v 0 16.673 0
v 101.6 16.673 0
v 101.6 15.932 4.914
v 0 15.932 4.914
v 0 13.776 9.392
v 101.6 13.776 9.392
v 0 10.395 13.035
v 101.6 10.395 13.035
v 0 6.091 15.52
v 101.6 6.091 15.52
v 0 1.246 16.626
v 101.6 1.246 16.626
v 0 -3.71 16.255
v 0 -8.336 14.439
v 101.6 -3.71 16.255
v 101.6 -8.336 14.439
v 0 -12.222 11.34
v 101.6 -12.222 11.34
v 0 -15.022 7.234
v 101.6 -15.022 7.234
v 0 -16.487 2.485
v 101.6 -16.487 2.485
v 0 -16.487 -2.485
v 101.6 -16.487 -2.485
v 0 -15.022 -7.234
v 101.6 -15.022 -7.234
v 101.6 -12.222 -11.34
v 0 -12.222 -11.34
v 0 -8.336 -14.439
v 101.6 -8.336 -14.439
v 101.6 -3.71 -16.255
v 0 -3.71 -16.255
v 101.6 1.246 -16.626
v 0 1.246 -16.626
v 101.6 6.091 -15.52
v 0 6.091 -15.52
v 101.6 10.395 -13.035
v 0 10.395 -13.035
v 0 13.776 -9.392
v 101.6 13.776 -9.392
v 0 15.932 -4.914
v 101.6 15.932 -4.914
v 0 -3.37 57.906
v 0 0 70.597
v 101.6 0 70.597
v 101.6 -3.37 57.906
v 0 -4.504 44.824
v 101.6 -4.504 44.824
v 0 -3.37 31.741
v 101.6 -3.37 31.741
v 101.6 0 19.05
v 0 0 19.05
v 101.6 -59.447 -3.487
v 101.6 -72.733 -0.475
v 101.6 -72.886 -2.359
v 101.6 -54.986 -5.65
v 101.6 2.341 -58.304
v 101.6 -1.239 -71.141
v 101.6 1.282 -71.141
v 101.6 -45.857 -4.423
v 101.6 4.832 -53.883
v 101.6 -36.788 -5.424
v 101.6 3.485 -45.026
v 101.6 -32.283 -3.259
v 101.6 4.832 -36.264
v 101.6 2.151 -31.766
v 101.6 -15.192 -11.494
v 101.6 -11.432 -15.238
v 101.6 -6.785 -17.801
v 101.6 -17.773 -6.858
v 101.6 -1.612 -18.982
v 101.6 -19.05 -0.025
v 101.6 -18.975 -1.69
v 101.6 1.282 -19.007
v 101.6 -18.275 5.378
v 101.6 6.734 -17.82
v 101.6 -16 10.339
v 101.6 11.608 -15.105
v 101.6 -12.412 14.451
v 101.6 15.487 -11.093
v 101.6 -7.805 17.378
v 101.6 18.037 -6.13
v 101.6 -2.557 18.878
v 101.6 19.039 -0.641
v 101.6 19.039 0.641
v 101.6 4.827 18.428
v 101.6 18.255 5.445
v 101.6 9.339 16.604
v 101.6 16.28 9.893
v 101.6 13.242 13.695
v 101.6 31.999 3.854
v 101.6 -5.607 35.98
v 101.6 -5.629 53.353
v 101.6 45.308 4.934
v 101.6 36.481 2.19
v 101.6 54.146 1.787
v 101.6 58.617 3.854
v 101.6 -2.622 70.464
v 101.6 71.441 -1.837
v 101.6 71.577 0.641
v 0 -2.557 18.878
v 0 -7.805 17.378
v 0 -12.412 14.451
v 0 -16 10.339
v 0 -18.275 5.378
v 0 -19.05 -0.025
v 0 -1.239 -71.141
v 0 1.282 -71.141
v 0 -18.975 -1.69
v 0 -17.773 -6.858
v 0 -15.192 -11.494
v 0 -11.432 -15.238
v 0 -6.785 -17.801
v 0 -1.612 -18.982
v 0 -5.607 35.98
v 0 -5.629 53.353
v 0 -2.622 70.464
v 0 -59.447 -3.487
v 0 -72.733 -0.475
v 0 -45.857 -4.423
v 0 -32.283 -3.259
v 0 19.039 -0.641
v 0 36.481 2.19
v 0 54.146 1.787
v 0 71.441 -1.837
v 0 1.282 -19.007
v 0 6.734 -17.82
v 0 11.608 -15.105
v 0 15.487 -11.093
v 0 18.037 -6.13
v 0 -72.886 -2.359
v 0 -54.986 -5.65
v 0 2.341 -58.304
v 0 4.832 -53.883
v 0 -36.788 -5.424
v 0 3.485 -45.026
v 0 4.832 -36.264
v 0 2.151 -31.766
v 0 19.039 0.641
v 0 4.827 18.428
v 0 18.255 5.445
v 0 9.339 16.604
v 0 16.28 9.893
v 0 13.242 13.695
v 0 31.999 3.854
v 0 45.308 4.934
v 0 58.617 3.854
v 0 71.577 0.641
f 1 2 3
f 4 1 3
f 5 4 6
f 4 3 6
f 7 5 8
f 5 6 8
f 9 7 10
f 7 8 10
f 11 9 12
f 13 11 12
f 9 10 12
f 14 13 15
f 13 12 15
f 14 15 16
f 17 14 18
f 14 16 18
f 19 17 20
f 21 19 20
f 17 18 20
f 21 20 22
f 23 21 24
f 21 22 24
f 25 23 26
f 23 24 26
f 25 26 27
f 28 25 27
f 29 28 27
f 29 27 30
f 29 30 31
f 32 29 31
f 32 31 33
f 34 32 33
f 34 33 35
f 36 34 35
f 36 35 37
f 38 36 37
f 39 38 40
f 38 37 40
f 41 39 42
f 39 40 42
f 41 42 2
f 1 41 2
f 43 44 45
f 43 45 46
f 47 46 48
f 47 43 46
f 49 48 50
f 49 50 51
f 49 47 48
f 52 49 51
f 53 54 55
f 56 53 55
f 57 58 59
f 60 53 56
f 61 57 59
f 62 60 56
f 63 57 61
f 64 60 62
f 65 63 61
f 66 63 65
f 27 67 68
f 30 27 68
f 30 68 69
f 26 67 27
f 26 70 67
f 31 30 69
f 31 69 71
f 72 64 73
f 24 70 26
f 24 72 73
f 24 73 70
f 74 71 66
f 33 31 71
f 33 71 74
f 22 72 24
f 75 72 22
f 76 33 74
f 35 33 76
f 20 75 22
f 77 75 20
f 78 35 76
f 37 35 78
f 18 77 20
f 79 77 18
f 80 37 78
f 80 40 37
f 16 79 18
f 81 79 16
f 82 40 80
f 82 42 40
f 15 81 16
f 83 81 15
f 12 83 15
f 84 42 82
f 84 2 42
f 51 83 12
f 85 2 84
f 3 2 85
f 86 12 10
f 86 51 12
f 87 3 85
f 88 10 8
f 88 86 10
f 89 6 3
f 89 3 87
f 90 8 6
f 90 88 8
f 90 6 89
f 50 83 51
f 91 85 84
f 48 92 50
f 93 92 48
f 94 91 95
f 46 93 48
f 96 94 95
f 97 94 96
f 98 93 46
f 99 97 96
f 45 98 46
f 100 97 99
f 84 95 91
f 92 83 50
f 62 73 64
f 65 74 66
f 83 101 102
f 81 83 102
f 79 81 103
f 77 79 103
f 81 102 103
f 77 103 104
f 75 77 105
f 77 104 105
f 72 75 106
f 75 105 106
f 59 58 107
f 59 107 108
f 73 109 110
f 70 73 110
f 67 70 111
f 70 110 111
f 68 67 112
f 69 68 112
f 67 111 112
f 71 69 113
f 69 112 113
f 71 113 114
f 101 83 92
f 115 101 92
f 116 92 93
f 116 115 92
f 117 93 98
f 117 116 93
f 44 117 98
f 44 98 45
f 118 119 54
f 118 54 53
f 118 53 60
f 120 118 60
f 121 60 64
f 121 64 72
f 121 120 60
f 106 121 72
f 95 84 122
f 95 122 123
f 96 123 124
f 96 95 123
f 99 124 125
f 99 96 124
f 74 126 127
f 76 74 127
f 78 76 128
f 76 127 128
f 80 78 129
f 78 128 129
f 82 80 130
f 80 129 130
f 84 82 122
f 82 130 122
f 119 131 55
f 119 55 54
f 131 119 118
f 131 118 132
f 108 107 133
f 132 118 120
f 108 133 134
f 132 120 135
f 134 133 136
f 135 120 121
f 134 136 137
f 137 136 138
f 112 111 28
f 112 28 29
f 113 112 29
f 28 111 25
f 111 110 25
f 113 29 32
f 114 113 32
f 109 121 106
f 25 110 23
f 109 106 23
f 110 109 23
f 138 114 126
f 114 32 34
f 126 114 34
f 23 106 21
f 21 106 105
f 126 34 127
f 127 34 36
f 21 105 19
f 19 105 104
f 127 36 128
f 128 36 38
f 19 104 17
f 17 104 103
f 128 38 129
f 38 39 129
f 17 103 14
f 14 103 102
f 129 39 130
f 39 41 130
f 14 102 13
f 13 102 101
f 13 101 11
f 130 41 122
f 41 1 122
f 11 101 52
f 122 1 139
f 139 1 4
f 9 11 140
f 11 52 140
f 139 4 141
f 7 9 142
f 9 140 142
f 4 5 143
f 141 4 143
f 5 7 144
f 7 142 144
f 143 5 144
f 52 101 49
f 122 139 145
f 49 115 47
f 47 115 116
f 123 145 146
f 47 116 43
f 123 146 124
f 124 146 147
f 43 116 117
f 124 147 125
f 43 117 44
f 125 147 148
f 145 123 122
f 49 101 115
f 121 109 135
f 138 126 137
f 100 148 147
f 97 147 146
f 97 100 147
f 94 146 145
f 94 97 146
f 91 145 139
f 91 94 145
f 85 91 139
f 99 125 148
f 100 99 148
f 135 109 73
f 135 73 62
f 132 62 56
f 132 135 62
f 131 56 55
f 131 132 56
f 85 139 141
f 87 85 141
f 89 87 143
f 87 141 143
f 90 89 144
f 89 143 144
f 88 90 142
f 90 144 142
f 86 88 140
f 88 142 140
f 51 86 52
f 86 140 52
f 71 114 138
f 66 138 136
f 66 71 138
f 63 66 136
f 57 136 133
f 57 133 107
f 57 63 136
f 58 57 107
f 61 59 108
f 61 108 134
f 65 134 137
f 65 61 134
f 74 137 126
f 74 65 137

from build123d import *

# Parameters (mm, degrees)
F0_R      = 19.05
F1_DEPTH  = 101.6
F2_R      = 16.672802
F3_DEPTH  = 101.6
F5_DEPTH  = 101.6
F7_DEPTH  = 101.6
F9_DEPTH  = 101.6
F11_DEPTH = 101.6


with BuildPart() as f1:
    # F0 (on Right) → F1 (new body)
    with BuildSketch(Plane.YZ):
        Circle(F0_R)
    extrude(amount=F1_DEPTH)

    # F2 (on face) → F3 (cut)
    with BuildSketch(Plane.YZ.offset(101.6)):
        Circle(F2_R)
    extrude(amount=-F3_DEPTH, mode=Mode.SUBTRACT)

    # F4 (on face) → F5 (join)
    with BuildSketch(Plane(origin=(0, 0, 0), x_dir=(0, -1, 0), z_dir=(-1, 0, 0))):
        with BuildLine():
            Line((0, 19.05), (2.557494, 18.877545))
            ThreePointArc((2.557494, 18.877545), (5.998328, 44.666261), (2.622403, 70.463553))
            Line((2.622403, 70.463553), (0, 70.597149))
            ThreePointArc((0, 70.597149), (4.50405, 44.823575), (0, 19.05))
        make_face()
    extrude(amount=-F5_DEPTH)

    # F6 (on face) → F7 (join)
    with BuildSketch(Plane.YZ.offset(101.6)):
        with BuildLine():
            Line((-1.23902, -71.141139), (1.281651, -71.141139))
            ThreePointArc((1.281651, -71.141139), (5.279028, -45.073988), (1.281651, -19.006837))
            Line((1.281651, -19.006837), (-1.612408, -18.98164))
            ThreePointArc((-1.612408, -18.98164), (3.484779, -45.026237), (-1.23902, -71.141139))
        make_face()
    extrude(amount=-F7_DEPTH)

    # F8 (on face) → F9 (join)
    with BuildSketch(Plane(origin=(0, 0, 0), x_dir=(0, -1, 0), z_dir=(-1, 0, 0))):
        with BuildLine():
            Line((18.974914, 0), (18.974914, -1.689716))
            ThreePointArc((18.974914, -1.689716), (45.881311, -5.978723), (72.88587, -2.358837))
            Line((72.88587, -2.358837), (72.733122, -0.475401))
            ThreePointArc((72.733122, -0.475401), (45.817013, -4.422211), (18.974914, 0))
        make_face()
    extrude(amount=-F9_DEPTH)

    # F10 (on face) → F11 (join)
    with BuildSketch(Plane.YZ.offset(101.6)):
        with BuildLine():
            ThreePointArc((19.039206, -0.641189), (45.322797, 2.394132), (71.440637, -1.836555))
            Line((71.440637, -1.836555), (71.576953, 0.641189))
            ThreePointArc((71.576953, 0.641189), (45.30808, 4.934439), (19.039206, 0.641189))
            Line((19.039206, 0.641189), (19.039206, -0.641189))
        make_face()
    extrude(amount=-F11_DEPTH)


solid = f1.part
